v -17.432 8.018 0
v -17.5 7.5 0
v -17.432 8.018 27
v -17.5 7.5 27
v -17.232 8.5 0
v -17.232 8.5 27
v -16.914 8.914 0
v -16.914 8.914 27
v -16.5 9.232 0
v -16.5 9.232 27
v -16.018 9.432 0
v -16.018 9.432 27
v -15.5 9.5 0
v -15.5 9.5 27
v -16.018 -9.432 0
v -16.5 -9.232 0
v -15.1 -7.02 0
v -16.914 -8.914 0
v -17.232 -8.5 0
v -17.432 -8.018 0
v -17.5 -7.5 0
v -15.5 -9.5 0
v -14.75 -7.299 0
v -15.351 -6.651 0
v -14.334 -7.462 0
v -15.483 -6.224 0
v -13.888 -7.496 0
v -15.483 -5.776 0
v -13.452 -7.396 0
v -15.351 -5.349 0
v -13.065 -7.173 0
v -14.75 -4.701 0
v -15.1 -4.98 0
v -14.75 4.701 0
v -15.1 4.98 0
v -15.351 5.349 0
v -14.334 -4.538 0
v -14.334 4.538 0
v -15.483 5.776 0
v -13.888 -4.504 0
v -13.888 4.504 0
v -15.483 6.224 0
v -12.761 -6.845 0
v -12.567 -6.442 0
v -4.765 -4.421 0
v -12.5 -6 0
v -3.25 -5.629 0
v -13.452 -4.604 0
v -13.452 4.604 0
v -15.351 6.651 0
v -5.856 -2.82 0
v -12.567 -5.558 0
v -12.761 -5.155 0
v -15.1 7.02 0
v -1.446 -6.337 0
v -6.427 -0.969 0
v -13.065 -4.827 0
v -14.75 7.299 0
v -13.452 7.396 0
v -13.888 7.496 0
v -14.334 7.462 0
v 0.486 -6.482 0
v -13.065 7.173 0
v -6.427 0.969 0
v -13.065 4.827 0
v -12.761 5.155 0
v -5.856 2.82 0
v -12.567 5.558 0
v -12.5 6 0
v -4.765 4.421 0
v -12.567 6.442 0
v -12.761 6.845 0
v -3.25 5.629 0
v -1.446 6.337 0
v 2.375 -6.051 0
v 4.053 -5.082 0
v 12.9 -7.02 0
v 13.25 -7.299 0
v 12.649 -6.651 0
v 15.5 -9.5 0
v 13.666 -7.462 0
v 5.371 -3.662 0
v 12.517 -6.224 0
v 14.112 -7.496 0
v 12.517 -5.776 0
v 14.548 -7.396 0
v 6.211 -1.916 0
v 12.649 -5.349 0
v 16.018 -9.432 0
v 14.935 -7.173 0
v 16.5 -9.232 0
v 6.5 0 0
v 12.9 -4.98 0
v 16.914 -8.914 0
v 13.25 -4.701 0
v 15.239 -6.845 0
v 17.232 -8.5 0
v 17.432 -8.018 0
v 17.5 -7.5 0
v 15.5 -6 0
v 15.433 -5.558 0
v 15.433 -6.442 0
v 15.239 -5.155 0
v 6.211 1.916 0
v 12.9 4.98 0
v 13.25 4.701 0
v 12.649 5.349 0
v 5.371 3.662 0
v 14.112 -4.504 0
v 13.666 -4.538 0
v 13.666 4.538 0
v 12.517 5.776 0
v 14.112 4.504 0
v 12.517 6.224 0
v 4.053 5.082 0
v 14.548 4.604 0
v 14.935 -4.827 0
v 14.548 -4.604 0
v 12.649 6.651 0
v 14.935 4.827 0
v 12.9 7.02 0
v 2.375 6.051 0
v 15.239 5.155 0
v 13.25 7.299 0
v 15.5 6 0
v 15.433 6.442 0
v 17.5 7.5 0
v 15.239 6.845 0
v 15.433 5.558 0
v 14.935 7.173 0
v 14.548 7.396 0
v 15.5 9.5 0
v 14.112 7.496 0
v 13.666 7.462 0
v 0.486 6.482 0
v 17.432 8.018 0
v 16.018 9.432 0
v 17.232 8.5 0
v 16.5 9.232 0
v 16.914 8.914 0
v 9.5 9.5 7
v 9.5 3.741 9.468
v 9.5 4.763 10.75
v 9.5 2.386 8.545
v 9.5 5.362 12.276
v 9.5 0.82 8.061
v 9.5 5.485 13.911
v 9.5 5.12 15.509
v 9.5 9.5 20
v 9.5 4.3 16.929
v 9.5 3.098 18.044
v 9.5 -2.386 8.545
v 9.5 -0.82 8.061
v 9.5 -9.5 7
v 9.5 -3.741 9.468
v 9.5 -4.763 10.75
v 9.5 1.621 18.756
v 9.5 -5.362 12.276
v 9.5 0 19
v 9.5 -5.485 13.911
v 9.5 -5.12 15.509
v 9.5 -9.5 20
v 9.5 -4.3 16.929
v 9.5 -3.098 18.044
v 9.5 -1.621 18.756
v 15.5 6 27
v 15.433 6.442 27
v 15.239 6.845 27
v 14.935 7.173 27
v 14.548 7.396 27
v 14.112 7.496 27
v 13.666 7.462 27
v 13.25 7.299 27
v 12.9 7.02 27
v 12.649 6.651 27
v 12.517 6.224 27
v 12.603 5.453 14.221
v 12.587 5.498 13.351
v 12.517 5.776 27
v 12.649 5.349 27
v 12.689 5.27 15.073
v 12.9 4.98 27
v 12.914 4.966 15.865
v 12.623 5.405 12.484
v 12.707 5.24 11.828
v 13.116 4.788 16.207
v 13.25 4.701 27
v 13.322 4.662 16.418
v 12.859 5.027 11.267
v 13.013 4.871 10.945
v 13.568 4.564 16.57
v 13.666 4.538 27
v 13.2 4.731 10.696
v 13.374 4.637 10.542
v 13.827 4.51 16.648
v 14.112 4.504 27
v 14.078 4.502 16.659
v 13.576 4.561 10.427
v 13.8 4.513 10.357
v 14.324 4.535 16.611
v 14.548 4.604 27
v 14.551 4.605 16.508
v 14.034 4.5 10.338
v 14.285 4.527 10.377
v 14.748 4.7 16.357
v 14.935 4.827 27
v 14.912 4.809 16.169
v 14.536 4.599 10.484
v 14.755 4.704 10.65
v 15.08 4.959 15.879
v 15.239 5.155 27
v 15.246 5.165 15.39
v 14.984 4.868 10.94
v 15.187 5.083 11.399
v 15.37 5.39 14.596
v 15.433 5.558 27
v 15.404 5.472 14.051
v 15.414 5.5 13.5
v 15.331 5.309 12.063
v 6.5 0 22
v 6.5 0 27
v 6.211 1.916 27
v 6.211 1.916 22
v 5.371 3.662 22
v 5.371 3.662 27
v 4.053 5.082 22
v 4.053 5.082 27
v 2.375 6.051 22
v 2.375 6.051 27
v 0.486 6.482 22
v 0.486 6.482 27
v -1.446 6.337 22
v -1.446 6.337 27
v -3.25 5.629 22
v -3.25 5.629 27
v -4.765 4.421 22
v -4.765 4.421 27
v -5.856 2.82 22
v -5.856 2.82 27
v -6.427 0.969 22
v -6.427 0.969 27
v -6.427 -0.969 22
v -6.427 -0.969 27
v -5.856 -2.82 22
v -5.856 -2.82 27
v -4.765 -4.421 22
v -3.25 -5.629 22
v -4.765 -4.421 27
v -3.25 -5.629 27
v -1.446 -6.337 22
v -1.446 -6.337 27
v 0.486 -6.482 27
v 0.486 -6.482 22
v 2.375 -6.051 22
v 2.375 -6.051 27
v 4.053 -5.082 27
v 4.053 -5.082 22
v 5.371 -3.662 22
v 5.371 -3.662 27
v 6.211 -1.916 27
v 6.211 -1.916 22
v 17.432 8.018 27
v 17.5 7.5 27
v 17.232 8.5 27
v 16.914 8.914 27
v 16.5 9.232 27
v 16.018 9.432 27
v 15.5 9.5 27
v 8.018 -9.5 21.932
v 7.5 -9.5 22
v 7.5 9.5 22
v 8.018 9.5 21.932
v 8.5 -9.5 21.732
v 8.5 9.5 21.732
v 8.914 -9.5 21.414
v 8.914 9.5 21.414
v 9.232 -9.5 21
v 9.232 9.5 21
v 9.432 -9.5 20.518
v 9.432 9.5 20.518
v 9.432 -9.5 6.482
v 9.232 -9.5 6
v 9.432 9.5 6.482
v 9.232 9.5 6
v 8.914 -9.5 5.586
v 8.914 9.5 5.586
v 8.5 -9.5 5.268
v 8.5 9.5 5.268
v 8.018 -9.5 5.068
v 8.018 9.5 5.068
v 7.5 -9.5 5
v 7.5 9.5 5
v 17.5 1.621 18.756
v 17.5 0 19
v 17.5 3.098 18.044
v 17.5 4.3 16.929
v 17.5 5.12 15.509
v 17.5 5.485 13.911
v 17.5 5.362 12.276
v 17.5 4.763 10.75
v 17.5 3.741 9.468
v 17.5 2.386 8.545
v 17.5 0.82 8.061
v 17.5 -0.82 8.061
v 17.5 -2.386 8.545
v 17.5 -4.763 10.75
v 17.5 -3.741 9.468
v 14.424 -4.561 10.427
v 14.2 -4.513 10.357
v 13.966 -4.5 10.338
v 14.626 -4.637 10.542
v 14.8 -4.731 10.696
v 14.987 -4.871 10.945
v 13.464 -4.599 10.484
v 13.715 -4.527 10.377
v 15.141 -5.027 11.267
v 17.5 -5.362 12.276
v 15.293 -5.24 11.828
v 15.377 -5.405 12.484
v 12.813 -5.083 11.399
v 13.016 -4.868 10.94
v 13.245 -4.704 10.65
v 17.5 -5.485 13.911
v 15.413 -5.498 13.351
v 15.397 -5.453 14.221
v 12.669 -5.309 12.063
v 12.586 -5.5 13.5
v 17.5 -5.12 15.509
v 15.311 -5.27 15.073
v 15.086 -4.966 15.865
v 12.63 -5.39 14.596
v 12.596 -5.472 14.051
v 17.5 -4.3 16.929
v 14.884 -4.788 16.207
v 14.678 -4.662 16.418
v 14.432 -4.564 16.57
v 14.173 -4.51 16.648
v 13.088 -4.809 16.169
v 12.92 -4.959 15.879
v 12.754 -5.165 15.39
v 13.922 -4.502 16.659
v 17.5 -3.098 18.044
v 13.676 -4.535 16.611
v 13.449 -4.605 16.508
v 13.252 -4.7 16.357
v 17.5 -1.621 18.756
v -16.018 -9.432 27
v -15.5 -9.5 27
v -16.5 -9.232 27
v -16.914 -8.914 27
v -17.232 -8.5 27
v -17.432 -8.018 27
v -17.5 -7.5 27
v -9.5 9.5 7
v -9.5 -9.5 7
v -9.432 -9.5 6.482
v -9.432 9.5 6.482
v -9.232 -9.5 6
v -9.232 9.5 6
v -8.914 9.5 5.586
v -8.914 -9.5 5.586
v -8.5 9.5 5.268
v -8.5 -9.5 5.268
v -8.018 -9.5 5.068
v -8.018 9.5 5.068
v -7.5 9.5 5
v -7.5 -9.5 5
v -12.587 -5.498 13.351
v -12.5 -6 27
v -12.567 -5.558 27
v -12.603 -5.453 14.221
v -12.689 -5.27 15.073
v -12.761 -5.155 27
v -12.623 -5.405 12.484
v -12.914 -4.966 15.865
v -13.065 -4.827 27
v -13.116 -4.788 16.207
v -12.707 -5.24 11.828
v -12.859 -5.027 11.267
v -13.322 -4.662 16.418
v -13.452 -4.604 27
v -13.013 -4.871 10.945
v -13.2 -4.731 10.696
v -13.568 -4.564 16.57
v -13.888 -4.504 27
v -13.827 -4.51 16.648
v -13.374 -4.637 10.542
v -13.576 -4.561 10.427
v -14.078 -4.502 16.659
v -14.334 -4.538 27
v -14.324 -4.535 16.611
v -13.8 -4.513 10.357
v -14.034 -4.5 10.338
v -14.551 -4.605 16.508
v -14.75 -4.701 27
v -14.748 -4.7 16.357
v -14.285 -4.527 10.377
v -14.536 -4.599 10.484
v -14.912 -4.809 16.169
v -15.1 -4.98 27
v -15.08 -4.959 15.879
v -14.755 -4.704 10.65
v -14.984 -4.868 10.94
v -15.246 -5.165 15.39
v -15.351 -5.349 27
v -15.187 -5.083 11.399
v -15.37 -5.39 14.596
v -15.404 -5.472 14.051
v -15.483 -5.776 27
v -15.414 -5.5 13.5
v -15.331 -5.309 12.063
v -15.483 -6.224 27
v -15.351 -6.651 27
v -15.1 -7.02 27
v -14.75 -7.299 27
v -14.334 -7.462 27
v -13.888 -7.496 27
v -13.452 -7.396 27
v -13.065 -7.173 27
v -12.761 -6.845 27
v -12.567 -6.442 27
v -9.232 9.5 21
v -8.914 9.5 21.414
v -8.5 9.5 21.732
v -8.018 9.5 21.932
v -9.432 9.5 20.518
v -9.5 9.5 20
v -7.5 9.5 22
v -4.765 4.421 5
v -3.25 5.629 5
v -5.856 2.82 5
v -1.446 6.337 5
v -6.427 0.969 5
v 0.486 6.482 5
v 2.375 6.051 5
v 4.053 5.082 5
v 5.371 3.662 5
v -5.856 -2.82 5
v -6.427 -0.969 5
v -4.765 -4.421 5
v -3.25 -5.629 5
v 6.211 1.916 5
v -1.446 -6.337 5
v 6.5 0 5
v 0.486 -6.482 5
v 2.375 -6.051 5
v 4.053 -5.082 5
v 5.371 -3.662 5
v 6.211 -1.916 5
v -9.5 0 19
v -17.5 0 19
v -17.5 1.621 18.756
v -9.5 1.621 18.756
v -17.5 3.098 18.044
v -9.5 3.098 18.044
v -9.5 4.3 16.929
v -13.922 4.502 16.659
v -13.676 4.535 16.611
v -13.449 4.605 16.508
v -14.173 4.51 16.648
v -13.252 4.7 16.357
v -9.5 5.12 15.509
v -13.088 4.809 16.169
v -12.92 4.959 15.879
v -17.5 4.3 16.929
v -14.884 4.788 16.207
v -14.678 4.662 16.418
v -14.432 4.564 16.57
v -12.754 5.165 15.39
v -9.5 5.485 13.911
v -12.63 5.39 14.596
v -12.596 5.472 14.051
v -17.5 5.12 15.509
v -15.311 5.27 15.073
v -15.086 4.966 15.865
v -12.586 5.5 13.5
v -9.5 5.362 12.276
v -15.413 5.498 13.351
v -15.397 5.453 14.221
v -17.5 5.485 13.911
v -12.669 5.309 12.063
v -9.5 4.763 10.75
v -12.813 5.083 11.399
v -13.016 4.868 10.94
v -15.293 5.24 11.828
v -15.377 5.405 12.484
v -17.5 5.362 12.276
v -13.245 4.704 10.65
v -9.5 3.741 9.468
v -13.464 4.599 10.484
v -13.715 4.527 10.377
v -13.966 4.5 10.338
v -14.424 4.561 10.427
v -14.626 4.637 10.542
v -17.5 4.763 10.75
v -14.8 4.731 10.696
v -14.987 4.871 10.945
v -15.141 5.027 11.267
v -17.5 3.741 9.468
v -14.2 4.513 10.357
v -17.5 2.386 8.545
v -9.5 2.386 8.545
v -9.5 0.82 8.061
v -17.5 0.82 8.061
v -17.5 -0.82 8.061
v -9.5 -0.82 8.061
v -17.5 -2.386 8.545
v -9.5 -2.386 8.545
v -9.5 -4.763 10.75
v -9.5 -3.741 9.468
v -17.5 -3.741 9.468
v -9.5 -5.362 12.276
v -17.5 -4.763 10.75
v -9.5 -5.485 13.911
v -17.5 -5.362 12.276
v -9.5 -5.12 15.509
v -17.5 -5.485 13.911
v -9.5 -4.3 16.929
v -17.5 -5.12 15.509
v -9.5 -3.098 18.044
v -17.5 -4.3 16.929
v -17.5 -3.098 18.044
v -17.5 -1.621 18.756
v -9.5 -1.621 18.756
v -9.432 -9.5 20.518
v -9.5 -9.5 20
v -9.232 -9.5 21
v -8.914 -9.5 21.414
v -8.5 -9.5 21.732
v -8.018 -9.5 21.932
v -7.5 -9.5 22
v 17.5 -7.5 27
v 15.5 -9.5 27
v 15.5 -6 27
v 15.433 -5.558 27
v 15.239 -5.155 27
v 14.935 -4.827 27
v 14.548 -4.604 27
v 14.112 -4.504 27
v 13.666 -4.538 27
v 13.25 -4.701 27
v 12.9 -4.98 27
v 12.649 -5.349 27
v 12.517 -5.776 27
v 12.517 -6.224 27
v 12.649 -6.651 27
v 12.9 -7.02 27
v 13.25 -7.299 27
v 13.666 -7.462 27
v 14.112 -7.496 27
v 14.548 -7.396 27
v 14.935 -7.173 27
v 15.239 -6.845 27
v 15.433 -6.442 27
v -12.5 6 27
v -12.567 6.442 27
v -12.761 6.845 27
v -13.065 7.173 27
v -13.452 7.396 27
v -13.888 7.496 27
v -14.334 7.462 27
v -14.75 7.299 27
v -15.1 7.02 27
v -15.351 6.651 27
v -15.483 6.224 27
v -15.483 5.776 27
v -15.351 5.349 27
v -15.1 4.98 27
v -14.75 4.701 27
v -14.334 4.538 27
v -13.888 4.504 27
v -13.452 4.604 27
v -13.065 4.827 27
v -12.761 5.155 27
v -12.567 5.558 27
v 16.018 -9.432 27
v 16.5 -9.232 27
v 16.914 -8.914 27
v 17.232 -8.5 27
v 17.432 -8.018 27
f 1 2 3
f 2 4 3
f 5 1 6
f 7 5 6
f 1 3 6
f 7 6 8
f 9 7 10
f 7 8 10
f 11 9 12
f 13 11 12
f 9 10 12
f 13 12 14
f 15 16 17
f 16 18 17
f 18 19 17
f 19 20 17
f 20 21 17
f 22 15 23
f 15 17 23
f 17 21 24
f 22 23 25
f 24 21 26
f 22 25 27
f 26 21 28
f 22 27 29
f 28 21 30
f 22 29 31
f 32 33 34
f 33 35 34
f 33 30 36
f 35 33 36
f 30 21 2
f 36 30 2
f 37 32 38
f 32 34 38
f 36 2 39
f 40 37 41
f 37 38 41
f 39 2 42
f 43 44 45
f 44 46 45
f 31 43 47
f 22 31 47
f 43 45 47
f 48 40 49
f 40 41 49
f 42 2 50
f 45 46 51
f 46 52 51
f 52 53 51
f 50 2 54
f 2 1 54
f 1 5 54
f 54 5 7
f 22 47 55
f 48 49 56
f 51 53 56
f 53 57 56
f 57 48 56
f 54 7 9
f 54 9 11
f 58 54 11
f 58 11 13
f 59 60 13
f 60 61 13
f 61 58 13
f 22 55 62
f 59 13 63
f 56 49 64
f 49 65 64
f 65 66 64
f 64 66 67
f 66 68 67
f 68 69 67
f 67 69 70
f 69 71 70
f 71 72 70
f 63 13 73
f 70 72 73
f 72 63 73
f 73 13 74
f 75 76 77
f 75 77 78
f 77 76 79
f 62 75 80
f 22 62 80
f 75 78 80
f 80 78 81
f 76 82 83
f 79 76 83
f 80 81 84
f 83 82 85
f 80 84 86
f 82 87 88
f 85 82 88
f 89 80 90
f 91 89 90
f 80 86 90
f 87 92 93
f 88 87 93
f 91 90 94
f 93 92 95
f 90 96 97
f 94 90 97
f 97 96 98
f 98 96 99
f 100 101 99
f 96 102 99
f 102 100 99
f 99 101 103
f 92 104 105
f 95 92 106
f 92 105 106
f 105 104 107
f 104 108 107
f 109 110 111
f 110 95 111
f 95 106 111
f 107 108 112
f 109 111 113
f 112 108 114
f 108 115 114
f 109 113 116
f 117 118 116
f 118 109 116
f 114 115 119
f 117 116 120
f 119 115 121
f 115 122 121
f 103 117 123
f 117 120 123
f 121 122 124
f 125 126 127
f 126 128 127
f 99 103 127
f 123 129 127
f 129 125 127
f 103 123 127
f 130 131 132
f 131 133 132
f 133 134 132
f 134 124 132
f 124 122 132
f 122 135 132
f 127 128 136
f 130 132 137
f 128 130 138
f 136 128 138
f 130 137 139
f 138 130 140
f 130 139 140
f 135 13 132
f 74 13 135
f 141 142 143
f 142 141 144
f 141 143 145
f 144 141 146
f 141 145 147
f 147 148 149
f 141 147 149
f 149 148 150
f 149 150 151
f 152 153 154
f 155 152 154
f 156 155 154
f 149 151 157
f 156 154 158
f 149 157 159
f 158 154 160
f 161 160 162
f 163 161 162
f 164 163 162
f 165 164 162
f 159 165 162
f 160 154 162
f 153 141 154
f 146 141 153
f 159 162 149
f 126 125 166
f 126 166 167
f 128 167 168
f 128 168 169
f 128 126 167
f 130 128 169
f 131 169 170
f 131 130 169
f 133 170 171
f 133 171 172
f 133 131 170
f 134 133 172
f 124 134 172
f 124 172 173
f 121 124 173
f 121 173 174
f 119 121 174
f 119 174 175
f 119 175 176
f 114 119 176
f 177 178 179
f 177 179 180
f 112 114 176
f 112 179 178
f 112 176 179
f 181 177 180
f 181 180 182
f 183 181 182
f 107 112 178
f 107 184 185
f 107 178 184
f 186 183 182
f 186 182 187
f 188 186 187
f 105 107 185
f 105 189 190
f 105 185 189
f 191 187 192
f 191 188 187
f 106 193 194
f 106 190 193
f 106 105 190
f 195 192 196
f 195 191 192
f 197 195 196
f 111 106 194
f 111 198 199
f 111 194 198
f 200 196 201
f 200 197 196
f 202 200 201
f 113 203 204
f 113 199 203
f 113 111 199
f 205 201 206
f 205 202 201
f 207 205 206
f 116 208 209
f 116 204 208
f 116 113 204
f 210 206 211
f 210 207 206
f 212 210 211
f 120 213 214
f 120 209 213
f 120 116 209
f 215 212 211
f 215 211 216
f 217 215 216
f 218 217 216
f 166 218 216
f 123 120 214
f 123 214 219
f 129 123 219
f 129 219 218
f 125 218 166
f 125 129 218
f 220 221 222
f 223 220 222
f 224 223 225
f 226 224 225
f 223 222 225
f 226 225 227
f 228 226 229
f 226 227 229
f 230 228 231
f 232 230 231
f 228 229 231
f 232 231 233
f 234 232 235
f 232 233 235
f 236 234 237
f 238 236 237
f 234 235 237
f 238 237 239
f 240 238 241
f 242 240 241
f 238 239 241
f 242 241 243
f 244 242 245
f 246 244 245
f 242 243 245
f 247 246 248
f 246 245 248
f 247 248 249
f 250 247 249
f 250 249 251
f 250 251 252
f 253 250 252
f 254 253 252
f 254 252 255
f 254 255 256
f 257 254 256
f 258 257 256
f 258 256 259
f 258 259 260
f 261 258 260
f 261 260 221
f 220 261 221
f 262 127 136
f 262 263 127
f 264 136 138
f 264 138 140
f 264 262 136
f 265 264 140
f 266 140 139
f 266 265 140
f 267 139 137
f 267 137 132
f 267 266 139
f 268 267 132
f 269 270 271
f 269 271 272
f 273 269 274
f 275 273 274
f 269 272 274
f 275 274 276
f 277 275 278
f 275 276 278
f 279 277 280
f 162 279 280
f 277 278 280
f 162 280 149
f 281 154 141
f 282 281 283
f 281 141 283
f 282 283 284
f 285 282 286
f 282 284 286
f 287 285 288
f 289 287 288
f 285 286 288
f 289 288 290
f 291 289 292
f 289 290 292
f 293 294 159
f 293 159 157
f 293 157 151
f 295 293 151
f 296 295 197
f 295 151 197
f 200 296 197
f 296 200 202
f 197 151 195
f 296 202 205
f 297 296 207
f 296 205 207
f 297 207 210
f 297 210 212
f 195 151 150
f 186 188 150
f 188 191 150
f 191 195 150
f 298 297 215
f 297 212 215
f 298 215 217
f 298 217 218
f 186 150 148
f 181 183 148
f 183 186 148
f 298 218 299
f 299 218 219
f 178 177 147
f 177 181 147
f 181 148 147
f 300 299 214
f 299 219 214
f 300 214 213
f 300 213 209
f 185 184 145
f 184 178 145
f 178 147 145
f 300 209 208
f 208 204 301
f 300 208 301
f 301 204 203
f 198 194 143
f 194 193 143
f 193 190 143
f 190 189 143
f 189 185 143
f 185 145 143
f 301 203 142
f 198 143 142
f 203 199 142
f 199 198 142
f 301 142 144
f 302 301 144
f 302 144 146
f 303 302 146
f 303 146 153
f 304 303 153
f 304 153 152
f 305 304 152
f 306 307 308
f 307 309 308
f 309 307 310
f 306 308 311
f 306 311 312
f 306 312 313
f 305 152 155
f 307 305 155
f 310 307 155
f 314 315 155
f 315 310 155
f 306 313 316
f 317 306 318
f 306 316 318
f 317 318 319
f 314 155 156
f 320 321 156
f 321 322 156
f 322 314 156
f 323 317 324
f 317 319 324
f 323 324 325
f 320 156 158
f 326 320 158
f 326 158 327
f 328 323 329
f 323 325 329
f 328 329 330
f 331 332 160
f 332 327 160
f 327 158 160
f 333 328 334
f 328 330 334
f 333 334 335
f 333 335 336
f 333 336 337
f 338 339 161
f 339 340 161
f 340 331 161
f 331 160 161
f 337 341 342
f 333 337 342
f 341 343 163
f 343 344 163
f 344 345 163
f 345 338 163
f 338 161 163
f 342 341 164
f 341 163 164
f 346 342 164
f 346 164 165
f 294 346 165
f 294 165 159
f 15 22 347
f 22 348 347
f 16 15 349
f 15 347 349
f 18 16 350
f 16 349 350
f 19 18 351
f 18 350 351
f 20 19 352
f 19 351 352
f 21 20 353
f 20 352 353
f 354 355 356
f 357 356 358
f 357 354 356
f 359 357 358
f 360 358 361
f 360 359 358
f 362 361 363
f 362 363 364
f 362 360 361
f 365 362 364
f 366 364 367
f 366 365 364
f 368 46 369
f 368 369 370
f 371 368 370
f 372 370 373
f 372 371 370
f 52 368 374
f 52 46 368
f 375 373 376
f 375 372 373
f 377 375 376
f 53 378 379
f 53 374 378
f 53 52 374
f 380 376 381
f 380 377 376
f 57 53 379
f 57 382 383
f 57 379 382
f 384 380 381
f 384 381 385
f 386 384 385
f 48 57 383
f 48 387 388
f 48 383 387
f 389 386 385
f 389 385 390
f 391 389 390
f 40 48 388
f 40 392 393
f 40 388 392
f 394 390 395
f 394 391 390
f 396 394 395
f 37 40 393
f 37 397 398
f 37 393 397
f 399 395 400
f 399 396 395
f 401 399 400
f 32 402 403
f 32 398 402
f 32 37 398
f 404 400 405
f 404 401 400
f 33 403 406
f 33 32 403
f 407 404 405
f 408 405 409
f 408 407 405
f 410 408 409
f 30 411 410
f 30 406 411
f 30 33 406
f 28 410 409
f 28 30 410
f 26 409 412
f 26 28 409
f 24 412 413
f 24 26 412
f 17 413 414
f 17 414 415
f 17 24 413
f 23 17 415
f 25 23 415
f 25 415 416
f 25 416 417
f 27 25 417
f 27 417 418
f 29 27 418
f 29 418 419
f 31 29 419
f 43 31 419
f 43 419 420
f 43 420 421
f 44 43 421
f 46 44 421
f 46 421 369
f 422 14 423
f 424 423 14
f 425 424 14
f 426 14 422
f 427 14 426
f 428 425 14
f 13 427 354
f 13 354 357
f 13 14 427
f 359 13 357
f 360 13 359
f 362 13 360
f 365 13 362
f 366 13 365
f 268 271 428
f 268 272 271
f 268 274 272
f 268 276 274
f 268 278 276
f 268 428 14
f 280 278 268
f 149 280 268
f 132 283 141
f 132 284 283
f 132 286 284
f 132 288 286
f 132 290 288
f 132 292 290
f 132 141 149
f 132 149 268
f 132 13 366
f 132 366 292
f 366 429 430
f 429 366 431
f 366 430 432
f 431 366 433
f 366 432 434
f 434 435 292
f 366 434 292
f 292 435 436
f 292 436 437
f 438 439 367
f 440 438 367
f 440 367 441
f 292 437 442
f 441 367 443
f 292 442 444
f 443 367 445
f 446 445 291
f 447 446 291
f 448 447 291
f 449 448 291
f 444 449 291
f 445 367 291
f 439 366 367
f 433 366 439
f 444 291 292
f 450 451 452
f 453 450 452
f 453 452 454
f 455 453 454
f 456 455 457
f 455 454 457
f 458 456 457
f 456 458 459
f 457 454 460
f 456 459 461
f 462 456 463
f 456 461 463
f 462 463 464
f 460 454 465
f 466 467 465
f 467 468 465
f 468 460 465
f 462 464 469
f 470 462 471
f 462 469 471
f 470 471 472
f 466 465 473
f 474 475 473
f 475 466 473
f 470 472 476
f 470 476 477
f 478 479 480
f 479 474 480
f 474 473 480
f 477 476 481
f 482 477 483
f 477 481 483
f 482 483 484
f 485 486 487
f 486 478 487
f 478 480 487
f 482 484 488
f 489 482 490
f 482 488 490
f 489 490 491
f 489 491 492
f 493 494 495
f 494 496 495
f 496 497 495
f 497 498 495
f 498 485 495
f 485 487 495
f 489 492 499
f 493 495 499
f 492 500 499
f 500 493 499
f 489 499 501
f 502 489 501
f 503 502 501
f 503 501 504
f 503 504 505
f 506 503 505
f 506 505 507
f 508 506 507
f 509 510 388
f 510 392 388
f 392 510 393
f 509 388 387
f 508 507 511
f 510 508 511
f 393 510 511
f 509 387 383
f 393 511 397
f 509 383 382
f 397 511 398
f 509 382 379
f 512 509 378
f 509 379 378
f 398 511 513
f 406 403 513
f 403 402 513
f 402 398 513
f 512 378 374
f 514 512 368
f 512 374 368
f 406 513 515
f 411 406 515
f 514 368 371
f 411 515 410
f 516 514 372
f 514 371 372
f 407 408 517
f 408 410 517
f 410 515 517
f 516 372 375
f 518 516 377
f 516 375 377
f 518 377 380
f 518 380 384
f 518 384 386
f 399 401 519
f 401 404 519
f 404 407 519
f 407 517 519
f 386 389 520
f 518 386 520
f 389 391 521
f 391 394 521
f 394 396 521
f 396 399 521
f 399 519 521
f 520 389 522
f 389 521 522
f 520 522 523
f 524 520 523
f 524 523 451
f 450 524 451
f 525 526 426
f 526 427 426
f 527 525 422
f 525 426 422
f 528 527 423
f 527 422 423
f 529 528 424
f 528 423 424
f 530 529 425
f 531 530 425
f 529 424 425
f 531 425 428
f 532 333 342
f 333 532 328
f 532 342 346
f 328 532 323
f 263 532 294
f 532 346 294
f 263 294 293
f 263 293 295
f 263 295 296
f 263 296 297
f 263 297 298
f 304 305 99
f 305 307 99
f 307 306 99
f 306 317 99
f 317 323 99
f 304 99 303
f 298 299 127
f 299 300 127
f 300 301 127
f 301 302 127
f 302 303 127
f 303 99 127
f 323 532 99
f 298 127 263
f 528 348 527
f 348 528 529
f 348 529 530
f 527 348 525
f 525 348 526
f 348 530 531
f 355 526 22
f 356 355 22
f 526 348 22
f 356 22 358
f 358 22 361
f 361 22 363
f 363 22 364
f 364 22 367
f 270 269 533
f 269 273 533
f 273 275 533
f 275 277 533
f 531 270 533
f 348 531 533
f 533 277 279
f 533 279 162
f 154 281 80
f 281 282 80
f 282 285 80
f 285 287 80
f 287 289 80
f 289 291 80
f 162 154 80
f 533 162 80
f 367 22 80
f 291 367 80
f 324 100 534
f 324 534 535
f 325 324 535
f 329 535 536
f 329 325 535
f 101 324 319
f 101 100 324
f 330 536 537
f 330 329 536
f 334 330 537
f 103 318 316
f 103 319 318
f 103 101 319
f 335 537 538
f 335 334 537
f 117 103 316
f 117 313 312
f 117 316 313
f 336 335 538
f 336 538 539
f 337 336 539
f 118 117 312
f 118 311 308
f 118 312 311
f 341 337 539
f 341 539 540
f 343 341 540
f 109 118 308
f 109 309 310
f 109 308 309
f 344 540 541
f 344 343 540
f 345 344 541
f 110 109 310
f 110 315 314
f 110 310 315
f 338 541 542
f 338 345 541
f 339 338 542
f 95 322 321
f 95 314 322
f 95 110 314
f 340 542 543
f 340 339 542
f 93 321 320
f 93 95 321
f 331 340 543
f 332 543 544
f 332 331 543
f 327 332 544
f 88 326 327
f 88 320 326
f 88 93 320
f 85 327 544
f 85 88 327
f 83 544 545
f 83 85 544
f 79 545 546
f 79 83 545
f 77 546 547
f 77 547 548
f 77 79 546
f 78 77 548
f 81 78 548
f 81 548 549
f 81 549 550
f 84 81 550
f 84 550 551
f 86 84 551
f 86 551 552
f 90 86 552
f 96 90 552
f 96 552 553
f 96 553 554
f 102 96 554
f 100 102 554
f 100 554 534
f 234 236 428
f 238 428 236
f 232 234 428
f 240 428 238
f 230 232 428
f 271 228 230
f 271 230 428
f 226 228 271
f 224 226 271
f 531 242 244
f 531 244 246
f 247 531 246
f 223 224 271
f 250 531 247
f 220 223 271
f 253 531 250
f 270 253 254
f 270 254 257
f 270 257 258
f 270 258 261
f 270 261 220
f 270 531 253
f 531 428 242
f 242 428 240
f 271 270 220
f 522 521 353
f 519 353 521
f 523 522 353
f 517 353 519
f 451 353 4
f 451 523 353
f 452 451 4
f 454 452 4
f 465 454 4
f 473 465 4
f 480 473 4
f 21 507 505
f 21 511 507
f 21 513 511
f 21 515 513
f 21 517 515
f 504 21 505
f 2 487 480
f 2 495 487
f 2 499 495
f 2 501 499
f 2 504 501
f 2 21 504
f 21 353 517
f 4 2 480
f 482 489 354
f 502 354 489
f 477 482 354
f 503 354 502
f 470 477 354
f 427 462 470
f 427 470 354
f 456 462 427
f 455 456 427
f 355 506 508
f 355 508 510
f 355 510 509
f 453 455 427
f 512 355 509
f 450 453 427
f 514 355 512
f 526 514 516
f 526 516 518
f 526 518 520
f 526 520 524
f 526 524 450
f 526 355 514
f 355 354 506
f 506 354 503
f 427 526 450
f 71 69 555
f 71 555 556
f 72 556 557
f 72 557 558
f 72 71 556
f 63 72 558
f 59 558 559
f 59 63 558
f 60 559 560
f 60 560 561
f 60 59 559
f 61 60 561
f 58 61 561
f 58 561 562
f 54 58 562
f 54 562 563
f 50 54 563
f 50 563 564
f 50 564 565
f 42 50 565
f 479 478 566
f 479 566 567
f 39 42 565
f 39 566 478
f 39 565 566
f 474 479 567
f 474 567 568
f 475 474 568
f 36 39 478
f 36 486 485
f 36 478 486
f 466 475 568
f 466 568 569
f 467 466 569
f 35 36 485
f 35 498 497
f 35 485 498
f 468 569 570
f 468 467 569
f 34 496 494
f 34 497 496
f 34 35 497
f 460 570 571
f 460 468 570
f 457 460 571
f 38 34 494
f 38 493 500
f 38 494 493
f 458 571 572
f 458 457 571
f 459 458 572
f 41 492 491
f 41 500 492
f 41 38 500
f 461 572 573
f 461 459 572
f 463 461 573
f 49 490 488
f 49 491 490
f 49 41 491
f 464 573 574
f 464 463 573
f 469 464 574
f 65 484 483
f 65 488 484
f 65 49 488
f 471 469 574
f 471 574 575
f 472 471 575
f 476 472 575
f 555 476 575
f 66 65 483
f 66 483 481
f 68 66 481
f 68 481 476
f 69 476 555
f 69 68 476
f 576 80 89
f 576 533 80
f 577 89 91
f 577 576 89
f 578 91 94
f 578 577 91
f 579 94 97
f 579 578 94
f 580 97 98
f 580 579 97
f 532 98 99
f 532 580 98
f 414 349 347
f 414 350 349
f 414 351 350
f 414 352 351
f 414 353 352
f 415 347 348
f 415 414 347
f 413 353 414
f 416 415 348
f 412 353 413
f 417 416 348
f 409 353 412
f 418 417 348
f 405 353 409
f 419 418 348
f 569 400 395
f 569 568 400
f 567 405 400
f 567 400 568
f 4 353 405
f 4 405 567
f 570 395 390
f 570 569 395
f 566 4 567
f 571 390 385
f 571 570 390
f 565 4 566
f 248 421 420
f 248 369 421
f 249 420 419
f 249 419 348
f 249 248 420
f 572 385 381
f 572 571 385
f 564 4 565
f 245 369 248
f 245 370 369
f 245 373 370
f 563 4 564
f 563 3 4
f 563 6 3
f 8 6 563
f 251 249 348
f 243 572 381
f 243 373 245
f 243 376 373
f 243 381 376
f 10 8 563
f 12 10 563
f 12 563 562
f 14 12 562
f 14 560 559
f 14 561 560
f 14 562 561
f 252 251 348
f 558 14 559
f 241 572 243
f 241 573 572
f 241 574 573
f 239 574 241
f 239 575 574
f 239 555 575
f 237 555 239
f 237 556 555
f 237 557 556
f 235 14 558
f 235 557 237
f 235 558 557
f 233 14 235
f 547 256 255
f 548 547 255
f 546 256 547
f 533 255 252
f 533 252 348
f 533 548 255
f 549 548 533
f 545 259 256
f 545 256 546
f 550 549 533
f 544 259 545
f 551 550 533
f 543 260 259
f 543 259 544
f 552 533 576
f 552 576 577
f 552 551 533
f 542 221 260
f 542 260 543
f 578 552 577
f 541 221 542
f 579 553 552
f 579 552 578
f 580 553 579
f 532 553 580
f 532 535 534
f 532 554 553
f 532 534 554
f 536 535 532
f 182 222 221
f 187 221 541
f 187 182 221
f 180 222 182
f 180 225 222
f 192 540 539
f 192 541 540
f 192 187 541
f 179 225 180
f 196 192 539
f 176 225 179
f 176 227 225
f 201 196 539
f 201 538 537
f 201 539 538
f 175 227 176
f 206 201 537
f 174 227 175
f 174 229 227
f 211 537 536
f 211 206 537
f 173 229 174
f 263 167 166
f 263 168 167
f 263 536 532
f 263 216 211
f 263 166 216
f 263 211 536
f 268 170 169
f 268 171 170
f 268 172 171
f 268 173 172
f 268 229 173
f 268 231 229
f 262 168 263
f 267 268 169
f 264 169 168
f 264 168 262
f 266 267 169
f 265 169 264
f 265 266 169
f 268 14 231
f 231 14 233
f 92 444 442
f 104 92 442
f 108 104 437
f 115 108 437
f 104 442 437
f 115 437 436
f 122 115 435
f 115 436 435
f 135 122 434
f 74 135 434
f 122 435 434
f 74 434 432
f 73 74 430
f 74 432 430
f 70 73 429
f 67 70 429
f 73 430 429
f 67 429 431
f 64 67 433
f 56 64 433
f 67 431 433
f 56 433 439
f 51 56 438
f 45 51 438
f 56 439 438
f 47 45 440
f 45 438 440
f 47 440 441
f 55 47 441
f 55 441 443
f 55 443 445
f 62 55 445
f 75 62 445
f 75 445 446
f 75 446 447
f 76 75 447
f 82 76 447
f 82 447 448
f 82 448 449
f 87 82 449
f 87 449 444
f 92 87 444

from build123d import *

# Parameters (mm, degrees)
SKETCH_1_W          = 35
SKETCH_1_H          = 19
SKETCH_1_R          = 1.5
EXTRUDE_1_DEPTH     = 27
SKETCH_2_W          = 19
SKETCH_2_H          = 17
CUT_EXTRUDE_1_DEPTH = 38.366428783
SKETCH_3_R          = 5.5
CUT_EXTRUDE_2_DEPTH = 46.213382975
SKETCH_4_R          = 6.5
CUT_EXTRUDE_3_DEPTH = 34.548472527
FILLET_1_R          = 2
FILLET_2_R          = 2


with BuildPart() as part:
    # 草图1 → 凸台-拉伸1 (new body)
    with BuildSketch(Plane.XY):
        Rectangle(SKETCH_1_W, SKETCH_1_H)
        with Locations((-14, 6)):
            Circle(SKETCH_1_R, mode=Mode.SUBTRACT)
        with Locations((14, 6)):
            Circle(SKETCH_1_R, mode=Mode.SUBTRACT)
        with Locations((14, -6)):
            Circle(SKETCH_1_R, mode=Mode.SUBTRACT)
        with Locations((-14, -6)):
            Circle(SKETCH_1_R, mode=Mode.SUBTRACT)
    extrude(amount=EXTRUDE_1_DEPTH)

    # 草图2 → 切除-拉伸1 (cut, through all)
    with BuildSketch(Plane.XZ.offset(9.5)):
        with Locations((0, 13.5)):
            Rectangle(SKETCH_2_W, SKETCH_2_H)
    extrude(amount=-CUT_EXTRUDE_1_DEPTH, mode=Mode.SUBTRACT)

    # 草图3 → 切除-拉伸2 (cut, through all)
    with BuildSketch(Plane.ZY.offset(17.5)):
        with Locations((13.5, 0)):
            Circle(SKETCH_3_R)
    extrude(amount=-CUT_EXTRUDE_2_DEPTH, mode=Mode.SUBTRACT)

    # 草图4 → 切除-拉伸3 (cut, through all)
    with BuildSketch(Plane.XY.offset(27)):
        Circle(SKETCH_4_R)
    extrude(amount=-CUT_EXTRUDE_3_DEPTH, mode=Mode.SUBTRACT)

    # 圆角1
    fillet_1_edges = [part.edges().sort_by_distance(p)[0] for p in [
        (9.5, 0, 22),
        (9.5, 0, 5),
        (-9.5, 0, 5),
        (-9.5, 0, 22),
    ]]
    fillet(fillet_1_edges, radius=FILLET_1_R)

    # 圆角2
    fillet_2_edges = [part.edges().sort_by_distance(p)[0] for p in [
        (17.5, -9.5, 13.5),
        (-17.5, -9.5, 13.5),
        (-17.5, 9.5, 13.5),
        (17.5, 9.5, 13.5),
    ]]
    fillet(fillet_2_edges, radius=FILLET_2_R)


solid = part.part
